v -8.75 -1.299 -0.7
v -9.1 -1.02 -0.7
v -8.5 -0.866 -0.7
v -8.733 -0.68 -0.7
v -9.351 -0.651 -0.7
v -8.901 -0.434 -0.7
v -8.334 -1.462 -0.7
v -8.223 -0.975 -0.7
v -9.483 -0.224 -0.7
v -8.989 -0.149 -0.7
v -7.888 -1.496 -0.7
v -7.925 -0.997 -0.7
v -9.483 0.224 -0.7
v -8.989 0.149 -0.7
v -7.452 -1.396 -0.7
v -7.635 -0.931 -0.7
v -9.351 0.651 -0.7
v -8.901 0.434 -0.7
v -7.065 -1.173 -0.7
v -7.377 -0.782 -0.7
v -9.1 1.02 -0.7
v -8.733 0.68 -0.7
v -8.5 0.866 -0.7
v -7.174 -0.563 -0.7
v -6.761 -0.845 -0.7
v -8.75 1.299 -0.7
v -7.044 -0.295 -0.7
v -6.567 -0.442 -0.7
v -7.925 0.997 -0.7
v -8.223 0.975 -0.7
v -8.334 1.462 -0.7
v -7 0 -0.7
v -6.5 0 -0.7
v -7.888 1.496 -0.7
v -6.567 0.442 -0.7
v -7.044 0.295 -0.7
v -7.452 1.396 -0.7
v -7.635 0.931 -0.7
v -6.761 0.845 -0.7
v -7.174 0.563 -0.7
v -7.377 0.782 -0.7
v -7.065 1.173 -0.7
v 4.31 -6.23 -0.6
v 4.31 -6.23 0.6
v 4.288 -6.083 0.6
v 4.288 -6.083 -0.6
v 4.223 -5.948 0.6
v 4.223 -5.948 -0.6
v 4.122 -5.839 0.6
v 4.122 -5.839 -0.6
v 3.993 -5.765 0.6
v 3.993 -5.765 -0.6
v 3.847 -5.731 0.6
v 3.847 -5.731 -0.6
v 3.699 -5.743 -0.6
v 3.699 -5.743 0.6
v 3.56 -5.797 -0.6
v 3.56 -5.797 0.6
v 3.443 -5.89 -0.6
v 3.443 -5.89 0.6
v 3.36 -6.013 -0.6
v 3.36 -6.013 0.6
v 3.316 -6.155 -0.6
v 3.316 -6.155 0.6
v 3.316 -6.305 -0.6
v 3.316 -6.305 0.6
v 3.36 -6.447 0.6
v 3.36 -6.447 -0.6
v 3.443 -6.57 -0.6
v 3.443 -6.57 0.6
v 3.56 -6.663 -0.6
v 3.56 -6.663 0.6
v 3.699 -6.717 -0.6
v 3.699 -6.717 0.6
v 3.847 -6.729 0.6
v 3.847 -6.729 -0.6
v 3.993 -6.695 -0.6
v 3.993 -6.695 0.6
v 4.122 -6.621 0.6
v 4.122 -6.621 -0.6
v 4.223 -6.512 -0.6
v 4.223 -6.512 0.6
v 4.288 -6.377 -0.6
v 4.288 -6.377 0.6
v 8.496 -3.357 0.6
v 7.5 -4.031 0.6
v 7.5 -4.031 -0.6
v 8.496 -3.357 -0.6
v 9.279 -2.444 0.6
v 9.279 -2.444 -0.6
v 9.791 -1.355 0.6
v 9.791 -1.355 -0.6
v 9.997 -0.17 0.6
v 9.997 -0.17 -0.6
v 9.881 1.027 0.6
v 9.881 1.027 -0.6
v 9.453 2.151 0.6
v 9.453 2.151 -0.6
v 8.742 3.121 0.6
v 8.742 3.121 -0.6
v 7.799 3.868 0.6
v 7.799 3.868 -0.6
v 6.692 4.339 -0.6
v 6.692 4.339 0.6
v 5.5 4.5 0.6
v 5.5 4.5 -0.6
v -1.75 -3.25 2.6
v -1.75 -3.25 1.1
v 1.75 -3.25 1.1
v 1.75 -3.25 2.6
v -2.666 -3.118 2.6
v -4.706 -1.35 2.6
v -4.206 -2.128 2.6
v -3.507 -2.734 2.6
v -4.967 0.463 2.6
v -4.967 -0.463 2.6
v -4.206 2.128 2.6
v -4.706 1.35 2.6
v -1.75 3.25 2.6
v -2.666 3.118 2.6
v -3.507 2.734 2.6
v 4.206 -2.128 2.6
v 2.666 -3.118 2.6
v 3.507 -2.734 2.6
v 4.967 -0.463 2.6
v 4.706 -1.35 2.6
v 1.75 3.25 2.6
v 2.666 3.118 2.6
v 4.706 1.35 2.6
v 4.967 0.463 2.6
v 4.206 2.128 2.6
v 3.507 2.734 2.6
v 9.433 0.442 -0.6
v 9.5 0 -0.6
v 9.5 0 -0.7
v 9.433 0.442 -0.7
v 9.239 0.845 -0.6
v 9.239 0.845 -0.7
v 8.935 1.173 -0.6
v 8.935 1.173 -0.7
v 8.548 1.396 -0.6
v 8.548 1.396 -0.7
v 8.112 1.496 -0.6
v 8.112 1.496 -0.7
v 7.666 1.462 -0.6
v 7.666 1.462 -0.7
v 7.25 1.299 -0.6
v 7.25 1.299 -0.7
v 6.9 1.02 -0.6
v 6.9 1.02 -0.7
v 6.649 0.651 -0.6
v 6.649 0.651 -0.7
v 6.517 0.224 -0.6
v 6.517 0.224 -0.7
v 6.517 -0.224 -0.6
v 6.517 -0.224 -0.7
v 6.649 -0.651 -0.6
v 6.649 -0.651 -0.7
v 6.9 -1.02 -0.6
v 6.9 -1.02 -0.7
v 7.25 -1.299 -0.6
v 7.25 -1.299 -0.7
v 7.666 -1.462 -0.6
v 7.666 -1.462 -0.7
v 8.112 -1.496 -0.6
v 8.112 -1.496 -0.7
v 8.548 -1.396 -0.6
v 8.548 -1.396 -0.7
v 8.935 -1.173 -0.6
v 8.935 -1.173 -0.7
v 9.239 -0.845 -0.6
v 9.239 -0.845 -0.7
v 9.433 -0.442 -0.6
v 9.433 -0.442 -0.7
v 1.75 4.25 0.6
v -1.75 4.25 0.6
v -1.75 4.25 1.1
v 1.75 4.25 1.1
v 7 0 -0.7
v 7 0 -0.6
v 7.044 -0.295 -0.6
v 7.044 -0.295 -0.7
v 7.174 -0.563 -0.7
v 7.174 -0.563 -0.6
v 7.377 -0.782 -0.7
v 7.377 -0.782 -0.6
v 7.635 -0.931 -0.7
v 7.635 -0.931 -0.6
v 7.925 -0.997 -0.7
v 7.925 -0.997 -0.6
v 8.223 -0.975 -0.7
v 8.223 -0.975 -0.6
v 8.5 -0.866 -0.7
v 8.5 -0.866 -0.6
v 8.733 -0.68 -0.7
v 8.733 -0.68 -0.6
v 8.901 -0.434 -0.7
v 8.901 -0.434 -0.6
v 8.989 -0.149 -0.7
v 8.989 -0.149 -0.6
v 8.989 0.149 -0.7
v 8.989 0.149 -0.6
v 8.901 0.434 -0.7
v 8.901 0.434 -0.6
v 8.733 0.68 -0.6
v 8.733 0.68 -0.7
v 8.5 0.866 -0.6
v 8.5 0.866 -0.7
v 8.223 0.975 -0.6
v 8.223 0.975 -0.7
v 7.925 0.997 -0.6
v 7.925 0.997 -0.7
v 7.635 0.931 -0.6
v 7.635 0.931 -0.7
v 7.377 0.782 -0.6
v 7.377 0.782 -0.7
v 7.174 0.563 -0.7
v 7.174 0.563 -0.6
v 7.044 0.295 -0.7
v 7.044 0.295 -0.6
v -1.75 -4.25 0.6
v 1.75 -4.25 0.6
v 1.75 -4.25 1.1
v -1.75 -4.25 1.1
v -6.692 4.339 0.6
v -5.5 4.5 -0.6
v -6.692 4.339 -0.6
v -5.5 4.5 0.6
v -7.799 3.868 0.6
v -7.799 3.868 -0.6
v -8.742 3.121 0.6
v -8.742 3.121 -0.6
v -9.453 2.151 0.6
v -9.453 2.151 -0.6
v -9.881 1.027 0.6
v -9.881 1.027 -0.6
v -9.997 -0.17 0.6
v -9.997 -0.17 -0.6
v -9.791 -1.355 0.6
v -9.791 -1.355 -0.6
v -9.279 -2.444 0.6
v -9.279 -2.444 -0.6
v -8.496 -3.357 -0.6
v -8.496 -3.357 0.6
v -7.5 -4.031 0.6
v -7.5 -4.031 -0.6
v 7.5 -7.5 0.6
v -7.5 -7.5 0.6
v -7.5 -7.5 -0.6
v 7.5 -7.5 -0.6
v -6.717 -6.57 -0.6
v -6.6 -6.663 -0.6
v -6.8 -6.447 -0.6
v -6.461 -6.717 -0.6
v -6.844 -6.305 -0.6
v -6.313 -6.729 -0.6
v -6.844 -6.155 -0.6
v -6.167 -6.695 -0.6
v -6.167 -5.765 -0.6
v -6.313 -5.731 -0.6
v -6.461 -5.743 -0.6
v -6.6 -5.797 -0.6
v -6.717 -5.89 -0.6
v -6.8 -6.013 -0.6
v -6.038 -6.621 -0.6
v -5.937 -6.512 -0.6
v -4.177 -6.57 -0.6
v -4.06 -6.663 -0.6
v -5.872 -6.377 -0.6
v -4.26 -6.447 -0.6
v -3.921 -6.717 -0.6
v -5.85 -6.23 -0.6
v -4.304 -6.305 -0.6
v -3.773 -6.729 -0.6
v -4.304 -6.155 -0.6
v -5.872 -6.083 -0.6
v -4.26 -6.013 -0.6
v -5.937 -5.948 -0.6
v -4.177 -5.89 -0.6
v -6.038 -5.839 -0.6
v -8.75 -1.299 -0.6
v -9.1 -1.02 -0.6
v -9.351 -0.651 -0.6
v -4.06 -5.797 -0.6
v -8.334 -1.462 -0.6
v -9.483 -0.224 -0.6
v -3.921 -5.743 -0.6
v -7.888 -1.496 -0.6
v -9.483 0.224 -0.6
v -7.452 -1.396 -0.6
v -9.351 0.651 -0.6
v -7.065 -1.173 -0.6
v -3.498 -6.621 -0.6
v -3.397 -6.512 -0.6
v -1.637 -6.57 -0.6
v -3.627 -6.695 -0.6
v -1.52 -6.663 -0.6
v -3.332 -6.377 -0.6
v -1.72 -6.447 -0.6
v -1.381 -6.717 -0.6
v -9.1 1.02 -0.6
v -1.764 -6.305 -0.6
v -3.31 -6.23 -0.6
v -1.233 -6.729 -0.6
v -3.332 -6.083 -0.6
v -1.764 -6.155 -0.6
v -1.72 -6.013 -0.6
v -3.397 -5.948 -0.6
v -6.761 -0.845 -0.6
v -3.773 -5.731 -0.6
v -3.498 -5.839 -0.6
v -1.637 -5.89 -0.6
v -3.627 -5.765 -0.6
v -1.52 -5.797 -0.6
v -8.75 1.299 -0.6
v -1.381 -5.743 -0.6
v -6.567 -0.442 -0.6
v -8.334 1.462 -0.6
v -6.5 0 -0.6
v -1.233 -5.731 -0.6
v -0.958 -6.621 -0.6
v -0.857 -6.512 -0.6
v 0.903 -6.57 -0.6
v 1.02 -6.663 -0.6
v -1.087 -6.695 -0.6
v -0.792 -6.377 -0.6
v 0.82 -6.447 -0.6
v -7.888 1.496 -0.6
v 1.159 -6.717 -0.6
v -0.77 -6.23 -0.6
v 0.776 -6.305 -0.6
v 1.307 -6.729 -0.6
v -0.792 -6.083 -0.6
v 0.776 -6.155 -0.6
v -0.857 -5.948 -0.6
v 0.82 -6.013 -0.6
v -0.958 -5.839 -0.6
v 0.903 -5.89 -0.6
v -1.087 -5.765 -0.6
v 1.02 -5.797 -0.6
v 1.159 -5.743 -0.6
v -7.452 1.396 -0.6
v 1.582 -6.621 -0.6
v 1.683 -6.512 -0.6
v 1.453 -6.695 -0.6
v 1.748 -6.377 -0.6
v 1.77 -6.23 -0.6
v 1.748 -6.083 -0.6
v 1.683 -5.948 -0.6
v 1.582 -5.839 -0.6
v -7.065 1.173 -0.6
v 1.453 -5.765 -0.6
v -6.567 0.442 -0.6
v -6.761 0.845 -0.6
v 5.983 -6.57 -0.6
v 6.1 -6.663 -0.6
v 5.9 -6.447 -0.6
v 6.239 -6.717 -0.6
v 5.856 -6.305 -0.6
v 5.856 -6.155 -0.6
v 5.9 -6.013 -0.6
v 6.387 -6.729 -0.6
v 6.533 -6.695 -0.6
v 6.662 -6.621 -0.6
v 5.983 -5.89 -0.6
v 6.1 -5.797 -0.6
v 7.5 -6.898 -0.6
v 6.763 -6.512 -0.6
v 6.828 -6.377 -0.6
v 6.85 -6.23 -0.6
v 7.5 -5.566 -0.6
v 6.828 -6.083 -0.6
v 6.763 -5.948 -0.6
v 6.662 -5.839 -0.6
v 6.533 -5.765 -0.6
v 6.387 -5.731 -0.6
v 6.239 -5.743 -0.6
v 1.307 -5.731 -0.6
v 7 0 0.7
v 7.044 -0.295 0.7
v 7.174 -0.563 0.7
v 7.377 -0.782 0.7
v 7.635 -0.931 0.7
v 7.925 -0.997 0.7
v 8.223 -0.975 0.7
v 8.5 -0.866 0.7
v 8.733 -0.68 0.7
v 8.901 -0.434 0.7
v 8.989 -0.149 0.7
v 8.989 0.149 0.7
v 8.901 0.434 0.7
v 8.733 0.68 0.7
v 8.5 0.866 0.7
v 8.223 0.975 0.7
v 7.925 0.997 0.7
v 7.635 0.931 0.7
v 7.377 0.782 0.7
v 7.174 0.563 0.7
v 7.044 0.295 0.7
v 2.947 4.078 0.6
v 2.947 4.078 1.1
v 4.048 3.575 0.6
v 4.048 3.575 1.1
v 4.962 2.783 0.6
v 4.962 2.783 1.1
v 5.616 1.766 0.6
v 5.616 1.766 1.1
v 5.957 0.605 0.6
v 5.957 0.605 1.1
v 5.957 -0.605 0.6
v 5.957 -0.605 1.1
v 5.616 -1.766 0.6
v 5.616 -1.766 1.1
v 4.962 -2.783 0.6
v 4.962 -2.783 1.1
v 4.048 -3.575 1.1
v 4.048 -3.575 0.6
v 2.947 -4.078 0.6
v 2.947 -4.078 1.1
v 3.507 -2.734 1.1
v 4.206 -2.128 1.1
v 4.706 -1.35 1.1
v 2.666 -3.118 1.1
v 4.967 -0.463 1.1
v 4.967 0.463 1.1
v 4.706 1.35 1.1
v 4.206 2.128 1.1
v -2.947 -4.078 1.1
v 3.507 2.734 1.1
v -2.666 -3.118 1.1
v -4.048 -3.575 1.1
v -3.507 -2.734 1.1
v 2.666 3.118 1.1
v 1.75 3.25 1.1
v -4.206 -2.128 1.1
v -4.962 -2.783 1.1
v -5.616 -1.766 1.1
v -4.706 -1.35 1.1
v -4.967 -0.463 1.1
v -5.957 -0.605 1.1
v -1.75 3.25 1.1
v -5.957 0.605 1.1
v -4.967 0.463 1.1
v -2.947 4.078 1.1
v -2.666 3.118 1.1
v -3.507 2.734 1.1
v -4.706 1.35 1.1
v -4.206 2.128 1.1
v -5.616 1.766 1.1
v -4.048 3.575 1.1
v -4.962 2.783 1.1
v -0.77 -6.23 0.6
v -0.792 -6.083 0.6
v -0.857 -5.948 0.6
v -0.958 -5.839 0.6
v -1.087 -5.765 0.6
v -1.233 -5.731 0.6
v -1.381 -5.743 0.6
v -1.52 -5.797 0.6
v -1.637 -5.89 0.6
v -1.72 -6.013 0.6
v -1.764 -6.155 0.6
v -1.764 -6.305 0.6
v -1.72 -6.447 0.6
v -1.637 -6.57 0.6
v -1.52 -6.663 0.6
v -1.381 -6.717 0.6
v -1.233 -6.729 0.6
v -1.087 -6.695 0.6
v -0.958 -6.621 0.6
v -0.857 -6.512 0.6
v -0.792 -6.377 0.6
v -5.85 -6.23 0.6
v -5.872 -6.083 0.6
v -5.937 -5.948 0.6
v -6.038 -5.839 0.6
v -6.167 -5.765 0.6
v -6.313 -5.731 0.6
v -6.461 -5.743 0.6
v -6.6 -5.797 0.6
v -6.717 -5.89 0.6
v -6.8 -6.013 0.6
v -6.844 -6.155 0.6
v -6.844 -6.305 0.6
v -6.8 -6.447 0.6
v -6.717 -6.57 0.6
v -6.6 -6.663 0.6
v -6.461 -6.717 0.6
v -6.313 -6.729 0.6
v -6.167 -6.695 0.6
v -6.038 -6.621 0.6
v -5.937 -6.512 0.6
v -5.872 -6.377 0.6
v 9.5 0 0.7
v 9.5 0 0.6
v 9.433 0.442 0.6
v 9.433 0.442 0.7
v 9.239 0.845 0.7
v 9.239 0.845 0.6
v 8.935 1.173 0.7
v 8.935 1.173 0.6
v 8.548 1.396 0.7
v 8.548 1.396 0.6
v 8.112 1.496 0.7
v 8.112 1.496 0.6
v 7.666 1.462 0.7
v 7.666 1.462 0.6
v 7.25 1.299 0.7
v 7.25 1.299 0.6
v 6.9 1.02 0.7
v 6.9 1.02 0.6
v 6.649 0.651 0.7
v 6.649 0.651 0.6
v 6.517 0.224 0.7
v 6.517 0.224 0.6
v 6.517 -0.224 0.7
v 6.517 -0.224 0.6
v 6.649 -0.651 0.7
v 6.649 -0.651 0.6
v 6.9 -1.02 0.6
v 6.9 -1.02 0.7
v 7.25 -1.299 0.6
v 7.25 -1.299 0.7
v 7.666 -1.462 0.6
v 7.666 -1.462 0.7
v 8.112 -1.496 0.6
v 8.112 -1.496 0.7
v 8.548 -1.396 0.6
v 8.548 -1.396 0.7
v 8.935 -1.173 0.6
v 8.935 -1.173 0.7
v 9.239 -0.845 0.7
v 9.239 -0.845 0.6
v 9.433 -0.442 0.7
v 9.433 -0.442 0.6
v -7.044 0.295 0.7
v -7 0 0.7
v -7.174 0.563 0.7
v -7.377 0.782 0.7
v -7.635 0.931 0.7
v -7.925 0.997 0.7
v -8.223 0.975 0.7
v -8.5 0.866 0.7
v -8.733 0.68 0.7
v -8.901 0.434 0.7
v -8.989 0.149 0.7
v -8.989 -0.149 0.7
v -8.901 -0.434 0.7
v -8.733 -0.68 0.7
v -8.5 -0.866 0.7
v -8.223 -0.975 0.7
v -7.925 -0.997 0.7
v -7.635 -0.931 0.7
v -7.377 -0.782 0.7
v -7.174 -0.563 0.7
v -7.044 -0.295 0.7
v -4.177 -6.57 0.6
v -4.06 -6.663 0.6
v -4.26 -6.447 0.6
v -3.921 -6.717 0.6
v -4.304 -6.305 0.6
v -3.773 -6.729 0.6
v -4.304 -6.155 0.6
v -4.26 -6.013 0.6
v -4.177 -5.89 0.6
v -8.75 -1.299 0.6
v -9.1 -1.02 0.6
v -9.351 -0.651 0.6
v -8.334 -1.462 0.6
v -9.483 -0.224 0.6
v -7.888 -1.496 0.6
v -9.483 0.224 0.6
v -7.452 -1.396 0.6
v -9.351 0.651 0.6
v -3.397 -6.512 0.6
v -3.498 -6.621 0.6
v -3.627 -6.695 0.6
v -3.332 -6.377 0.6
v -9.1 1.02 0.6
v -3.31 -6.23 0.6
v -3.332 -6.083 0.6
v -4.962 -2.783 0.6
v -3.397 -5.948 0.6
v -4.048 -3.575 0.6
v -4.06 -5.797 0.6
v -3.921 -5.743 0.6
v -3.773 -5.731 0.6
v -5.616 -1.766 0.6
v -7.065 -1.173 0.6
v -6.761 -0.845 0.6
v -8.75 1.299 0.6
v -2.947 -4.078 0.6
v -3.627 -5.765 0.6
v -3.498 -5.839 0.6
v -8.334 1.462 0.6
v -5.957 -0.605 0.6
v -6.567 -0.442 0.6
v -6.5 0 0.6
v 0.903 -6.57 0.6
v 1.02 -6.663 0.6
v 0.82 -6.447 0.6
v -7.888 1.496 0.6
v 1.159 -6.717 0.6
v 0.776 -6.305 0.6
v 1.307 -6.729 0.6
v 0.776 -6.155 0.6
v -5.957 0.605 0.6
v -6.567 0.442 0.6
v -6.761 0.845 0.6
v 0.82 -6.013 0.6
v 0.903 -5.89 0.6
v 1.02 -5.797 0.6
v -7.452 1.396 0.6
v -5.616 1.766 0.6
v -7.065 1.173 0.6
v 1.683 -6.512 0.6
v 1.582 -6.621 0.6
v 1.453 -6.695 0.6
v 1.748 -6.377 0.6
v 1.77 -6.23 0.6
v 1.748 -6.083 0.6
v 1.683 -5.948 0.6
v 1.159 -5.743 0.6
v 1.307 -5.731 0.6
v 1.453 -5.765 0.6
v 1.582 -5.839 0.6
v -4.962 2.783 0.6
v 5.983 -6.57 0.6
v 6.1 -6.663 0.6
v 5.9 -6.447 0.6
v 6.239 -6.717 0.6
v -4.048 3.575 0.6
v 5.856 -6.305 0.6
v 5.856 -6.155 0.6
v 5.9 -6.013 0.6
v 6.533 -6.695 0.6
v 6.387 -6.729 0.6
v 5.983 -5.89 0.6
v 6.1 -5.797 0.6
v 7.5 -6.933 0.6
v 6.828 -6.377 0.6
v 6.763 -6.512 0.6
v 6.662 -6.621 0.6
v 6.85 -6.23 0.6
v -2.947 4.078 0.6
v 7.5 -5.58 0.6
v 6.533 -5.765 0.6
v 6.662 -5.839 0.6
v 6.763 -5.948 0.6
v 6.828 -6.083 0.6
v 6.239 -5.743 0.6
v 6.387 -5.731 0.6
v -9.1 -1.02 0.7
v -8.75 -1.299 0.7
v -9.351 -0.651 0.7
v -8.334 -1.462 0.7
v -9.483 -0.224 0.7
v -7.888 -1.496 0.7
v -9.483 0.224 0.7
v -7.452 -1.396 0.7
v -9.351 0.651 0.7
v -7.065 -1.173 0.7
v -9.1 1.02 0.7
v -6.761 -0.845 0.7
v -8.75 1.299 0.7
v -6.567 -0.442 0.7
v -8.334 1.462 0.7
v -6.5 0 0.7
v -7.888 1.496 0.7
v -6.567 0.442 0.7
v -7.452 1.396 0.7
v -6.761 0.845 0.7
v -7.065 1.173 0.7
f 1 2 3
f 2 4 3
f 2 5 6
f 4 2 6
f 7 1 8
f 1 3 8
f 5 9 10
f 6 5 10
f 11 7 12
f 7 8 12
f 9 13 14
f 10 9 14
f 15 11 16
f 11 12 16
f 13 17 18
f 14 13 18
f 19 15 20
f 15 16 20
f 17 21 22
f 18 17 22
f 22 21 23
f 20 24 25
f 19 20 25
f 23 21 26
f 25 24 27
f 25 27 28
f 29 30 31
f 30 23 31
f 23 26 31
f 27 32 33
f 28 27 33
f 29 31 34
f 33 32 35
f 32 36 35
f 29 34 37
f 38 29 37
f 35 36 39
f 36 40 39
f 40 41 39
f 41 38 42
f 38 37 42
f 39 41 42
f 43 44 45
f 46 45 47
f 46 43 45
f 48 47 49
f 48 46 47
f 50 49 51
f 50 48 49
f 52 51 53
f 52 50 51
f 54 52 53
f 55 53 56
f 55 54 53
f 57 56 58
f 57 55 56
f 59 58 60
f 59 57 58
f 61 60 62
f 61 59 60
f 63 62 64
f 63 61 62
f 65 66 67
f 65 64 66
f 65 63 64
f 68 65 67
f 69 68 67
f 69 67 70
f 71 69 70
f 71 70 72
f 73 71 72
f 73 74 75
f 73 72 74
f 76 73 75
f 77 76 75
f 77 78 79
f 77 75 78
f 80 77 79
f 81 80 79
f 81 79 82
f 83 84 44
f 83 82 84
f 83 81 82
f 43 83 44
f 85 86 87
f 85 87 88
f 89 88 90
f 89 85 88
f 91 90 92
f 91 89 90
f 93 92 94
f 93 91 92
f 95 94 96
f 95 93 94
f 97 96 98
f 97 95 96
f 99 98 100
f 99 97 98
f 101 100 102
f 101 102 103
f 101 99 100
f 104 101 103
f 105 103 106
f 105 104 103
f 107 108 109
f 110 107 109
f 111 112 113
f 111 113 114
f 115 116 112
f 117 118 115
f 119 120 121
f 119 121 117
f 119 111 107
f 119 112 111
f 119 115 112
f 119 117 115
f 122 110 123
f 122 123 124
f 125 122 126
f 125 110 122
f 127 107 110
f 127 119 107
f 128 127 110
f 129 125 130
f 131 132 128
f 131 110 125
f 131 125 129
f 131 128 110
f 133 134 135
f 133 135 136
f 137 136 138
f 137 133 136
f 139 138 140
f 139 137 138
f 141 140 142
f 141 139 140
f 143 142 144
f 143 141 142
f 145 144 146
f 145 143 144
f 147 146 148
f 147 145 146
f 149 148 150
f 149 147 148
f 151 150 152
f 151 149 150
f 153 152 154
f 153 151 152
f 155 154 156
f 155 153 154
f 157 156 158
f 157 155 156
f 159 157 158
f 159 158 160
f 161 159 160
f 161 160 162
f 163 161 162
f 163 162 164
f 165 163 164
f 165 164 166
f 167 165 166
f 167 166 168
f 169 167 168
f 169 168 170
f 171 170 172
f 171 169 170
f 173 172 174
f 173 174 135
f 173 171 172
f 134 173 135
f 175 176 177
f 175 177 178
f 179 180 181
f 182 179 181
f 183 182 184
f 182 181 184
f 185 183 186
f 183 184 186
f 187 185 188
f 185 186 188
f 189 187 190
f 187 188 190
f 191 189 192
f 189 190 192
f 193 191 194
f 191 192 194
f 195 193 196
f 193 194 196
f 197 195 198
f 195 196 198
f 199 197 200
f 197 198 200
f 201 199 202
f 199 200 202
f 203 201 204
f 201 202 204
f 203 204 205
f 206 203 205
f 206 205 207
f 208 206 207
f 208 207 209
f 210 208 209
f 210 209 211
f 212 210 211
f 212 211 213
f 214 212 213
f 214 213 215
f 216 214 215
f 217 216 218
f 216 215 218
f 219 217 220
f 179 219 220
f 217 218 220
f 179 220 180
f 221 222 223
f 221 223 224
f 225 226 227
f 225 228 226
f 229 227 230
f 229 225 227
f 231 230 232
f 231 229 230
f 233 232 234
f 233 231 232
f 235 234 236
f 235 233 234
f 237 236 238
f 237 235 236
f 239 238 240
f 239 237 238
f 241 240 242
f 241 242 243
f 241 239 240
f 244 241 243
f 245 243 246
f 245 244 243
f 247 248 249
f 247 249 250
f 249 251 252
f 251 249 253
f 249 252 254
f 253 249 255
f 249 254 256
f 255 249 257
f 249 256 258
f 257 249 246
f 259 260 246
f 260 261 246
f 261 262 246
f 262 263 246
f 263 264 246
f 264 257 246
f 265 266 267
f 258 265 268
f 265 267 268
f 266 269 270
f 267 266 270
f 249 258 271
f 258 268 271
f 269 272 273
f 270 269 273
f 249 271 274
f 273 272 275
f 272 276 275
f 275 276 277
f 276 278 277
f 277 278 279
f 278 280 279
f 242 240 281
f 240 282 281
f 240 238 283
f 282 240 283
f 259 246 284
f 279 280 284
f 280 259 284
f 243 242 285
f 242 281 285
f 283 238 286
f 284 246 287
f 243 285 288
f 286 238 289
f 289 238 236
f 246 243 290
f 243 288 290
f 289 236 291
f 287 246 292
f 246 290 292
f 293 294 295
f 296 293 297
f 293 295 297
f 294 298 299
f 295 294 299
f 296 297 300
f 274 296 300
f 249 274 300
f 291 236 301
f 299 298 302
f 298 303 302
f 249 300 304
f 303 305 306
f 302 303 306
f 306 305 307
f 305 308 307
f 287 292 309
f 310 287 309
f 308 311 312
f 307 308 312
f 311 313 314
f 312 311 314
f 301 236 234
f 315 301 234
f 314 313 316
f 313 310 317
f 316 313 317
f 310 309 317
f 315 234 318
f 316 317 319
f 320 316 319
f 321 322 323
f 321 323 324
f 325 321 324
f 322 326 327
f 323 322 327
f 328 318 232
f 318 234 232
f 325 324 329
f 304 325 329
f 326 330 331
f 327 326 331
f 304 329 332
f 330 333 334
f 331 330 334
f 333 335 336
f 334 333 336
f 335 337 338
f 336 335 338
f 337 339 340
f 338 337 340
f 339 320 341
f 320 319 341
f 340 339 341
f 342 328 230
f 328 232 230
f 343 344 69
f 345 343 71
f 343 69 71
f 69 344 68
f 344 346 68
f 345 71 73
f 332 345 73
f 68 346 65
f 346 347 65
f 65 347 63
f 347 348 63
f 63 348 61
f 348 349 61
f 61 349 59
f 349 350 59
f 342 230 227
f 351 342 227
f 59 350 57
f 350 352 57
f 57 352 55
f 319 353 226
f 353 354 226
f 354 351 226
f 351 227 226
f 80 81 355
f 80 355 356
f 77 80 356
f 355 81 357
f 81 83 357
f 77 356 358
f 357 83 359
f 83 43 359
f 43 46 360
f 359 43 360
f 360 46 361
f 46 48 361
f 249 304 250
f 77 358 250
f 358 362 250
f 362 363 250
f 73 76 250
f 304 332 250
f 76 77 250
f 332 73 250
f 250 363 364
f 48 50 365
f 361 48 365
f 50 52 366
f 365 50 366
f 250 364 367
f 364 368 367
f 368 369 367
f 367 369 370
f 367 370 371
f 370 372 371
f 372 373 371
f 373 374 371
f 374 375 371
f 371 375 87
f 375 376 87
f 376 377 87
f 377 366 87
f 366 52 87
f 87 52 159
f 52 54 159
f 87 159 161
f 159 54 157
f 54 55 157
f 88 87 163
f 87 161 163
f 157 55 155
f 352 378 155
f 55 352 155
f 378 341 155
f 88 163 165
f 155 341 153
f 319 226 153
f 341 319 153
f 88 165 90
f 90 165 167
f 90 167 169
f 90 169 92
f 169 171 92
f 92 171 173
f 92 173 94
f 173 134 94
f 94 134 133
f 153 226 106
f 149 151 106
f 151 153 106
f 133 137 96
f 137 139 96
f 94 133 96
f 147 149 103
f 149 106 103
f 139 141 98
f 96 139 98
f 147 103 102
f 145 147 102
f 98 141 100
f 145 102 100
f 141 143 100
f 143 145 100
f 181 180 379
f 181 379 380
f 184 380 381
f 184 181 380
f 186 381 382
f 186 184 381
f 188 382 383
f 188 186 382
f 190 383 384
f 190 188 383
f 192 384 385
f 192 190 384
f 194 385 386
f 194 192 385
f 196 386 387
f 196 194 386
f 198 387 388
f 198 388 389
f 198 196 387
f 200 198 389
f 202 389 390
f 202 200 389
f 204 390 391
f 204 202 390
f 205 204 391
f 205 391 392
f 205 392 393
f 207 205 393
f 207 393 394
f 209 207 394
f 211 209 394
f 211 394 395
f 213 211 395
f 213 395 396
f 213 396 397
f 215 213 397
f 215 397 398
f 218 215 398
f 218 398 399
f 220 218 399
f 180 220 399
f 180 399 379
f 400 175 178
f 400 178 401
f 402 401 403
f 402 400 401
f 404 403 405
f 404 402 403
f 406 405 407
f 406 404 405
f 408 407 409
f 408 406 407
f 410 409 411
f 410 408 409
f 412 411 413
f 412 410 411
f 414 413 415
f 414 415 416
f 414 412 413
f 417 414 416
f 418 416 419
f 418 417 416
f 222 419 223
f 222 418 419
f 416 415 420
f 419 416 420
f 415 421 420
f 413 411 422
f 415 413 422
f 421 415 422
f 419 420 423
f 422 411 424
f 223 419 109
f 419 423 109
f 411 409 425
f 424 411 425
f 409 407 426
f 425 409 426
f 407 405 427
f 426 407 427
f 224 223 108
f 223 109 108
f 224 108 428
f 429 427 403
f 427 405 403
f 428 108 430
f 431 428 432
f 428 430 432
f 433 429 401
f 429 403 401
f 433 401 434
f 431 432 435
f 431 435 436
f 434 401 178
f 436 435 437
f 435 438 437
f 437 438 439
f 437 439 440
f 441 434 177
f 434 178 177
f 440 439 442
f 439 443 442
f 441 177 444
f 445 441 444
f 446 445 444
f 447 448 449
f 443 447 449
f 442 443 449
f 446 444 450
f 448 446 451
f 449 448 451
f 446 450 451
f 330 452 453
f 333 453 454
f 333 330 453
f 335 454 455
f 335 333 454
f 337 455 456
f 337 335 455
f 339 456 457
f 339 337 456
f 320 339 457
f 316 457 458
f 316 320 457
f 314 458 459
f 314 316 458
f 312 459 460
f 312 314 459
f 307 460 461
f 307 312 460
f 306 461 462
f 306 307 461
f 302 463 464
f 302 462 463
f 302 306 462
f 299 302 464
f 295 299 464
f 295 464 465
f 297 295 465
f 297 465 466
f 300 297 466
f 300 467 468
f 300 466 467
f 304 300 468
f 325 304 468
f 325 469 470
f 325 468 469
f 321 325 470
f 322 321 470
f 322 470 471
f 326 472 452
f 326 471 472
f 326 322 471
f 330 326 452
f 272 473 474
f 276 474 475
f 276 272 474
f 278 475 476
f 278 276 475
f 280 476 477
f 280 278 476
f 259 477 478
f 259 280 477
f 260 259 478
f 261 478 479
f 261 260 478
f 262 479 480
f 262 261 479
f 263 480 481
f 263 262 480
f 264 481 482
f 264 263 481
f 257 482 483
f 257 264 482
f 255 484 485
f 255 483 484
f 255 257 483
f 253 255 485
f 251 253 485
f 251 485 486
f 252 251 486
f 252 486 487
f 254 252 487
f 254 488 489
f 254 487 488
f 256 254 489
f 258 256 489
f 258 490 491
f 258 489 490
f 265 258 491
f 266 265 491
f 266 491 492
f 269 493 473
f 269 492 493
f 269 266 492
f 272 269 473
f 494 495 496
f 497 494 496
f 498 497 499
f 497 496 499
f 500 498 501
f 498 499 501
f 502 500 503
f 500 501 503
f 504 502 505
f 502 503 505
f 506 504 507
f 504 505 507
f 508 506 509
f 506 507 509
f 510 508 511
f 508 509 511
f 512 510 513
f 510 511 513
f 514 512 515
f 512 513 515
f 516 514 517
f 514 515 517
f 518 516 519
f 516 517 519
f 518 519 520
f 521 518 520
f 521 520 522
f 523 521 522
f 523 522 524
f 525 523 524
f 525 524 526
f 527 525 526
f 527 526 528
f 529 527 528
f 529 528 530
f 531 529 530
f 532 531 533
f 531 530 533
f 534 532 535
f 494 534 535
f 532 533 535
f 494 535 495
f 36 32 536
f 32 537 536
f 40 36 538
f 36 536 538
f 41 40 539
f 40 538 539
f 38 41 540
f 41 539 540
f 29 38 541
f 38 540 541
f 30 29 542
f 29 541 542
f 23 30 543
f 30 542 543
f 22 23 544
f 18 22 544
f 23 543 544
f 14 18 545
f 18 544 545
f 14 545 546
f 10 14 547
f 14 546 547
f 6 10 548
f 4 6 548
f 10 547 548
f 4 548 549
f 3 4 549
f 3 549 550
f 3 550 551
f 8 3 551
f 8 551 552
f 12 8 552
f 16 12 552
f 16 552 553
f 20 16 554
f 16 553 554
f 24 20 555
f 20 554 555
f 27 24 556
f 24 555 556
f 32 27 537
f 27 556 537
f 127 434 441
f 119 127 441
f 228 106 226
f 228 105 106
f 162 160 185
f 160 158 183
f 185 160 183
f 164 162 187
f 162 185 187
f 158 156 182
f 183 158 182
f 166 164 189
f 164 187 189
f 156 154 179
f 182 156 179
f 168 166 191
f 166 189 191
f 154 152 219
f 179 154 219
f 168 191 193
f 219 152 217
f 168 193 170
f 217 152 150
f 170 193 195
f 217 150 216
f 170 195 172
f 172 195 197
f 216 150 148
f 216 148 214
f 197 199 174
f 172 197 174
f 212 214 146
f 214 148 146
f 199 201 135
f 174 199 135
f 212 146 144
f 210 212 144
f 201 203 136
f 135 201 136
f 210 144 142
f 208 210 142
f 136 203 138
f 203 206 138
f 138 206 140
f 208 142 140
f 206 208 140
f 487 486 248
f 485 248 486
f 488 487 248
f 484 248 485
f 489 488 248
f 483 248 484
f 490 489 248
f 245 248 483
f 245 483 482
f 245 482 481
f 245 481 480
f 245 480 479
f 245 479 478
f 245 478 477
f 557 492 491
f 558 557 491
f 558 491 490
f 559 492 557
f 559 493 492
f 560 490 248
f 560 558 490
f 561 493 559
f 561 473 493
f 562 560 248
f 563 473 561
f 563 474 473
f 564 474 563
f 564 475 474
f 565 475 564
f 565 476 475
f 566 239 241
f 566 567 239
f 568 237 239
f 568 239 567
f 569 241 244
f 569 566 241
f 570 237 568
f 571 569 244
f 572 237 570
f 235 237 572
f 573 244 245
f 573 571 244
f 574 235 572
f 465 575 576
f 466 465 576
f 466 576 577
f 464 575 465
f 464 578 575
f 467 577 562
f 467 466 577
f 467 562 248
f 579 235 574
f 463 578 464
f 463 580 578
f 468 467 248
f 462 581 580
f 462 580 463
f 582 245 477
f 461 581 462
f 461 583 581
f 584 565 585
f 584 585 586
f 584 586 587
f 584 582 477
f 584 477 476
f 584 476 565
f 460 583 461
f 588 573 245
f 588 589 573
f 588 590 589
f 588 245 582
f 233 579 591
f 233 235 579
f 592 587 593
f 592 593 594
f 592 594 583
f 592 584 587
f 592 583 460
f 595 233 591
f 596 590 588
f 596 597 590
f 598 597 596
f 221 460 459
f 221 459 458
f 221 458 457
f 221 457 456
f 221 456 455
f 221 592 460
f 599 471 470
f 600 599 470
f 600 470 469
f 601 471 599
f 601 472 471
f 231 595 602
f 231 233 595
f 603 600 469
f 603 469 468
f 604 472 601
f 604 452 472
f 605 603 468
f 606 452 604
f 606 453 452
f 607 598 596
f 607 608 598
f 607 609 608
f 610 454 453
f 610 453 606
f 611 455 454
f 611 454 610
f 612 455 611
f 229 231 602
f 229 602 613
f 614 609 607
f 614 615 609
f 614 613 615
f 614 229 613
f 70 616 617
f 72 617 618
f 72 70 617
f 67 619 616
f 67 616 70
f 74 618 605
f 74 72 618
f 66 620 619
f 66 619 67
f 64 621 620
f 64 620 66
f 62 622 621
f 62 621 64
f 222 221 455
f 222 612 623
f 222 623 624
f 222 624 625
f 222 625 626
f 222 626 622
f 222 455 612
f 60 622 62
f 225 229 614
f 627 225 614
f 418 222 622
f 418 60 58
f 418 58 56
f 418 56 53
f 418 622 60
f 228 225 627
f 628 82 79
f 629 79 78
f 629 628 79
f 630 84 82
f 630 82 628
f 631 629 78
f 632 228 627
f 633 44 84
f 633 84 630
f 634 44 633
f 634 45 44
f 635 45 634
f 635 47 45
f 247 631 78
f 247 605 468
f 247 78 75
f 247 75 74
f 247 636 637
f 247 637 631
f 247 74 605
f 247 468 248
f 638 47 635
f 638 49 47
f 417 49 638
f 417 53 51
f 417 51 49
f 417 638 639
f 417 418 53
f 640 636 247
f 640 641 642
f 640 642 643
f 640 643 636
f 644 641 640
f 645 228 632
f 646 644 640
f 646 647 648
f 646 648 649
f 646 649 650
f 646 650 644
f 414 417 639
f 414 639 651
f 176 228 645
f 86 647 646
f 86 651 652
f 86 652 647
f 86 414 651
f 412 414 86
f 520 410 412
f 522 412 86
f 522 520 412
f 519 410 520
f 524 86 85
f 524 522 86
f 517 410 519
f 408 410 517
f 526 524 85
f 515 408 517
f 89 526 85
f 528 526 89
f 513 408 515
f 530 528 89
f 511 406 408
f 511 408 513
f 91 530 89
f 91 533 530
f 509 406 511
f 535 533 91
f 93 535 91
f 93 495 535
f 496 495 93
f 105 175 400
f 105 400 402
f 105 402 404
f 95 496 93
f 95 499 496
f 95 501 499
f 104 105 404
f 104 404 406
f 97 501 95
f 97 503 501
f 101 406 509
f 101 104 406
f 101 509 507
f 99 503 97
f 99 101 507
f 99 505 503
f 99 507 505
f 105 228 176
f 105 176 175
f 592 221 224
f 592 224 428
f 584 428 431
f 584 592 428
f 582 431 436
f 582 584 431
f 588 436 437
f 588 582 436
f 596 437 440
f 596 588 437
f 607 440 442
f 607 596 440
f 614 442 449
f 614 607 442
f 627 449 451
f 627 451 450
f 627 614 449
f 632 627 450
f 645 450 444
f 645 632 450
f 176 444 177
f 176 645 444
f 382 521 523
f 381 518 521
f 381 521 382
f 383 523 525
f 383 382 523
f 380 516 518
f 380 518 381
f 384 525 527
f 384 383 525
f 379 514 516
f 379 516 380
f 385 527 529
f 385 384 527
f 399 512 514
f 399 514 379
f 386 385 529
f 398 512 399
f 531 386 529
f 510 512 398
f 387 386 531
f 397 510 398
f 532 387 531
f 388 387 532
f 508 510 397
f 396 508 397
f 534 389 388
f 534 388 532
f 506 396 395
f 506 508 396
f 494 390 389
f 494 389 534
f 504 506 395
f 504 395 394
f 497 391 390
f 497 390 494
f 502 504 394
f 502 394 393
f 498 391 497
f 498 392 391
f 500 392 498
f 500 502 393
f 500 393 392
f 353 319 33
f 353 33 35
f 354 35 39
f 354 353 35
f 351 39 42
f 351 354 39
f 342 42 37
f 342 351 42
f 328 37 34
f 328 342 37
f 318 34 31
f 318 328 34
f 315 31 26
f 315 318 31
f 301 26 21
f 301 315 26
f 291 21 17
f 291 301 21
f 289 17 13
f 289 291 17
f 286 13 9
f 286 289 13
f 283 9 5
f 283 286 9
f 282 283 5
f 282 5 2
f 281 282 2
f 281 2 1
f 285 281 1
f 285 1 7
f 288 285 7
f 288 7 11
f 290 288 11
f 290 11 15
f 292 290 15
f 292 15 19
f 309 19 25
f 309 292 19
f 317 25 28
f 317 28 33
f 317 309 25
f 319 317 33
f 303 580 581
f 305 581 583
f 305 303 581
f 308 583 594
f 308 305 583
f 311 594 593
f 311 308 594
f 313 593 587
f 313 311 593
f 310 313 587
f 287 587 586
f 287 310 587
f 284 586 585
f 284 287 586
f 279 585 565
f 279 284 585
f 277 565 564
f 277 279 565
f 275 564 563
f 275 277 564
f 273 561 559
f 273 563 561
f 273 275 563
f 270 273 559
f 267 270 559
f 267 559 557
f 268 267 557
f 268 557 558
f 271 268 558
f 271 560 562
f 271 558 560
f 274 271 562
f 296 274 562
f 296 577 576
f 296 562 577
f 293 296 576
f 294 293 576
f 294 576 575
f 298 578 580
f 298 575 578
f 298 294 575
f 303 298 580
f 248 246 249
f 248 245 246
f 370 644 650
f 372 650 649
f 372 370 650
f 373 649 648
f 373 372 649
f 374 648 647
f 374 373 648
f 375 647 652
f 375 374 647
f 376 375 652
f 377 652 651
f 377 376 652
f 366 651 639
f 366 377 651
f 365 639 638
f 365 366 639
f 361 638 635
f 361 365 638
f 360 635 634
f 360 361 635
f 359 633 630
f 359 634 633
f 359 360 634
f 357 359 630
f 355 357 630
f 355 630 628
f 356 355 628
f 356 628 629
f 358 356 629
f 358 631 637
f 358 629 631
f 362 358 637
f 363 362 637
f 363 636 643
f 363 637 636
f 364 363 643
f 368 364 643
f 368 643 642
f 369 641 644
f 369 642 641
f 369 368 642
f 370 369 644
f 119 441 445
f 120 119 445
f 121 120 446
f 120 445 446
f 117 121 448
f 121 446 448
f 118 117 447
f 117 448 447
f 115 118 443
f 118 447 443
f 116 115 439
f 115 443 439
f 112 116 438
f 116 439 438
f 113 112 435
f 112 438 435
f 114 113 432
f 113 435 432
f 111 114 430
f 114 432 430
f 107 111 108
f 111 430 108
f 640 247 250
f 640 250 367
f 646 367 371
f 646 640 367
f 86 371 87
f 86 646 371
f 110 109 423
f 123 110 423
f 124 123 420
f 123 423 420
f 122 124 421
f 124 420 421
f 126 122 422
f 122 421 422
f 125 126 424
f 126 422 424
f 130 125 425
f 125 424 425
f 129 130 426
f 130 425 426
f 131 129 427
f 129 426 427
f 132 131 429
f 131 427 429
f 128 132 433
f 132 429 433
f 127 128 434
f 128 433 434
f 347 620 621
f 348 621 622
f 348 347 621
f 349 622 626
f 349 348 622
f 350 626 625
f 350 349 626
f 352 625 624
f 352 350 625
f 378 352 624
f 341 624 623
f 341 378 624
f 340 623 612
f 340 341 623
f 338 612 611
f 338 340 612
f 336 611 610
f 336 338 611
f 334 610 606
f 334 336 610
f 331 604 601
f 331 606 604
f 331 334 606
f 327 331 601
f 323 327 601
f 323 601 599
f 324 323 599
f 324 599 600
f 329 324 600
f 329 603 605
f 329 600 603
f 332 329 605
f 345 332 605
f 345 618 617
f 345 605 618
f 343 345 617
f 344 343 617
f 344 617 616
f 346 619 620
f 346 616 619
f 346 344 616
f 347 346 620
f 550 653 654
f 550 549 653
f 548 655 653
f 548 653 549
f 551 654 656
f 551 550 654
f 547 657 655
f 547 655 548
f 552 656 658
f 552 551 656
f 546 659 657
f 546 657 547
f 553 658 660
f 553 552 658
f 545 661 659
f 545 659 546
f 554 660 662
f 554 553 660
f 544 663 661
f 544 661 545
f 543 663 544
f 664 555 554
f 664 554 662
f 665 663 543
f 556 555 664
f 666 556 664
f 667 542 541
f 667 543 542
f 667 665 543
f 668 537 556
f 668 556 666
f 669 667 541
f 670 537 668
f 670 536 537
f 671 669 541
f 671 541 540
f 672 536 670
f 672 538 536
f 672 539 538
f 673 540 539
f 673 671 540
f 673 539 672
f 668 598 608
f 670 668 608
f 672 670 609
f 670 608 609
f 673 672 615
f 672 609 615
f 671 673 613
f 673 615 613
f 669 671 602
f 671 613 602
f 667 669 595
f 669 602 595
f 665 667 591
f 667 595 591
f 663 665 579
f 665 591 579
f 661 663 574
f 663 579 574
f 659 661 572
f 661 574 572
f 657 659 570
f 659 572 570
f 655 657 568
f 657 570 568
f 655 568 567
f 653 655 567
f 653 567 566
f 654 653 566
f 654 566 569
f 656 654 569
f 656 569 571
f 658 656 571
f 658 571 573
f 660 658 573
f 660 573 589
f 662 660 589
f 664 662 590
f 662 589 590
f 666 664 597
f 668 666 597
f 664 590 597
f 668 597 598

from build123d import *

# Parameters (mm, degrees)
ESQUISSE1_R           = 1
ESQUISSE1_R_2         = 0.5
BOSS_EXTRU_1_DEPTH    = 0.6
BOSS_EXTRU_2_DEPTH    = 0.5
BOSS_EXTRU_4_DEPTH    = 1.5
ESQUISSE3_R           = 1.5
ESQUISSE3_R_2         = 1
ESQUISSE3_R_3         = 0.65
ESQUISSE3_R_4         = 0.5
BOSS_EXTRU_3_DEPTH    = 0.1
CROQUIS1_W            = 0.446175557
CROQUIS1_H            = 1.332309964
CROQUIS1_W_2          = 0.675567057
CROQUIS1_H_2          = 1.353271183
CORTAR_EXTRUIR1_DEPTH = 17


with BuildPart() as part:
    # Esquisse1 → Boss.-Extru.1 (new, symmetric)
    with BuildSketch(Plane.XY):
        with BuildLine():
            Line((-7.5, -4.031128874), (-7.5, -7.5))
            Line((-7.5, -7.5), (7.5, -7.5))
            Line((7.5, -7.5), (7.5, -4.031128874))
            ThreePointArc((7.5, -4.031128874), (9.88121444, 1.027112473), (5.5, 4.5))
            Line((5.5, 4.5), (-5.5, 4.5))
            ThreePointArc((-5.5, 4.5), (-9.88121444, 1.027112473), (-7.5, -4.031128874))
        make_face()
        with Locations((-8, 0)):
            Circle(ESQUISSE1_R, mode=Mode.SUBTRACT)
        with Locations(Location((8, 0, 0), (0, 0, 180))):
            Circle(ESQUISSE1_R, mode=Mode.SUBTRACT)
        with Locations((-6.35, -6.23)):
            Circle(ESQUISSE1_R_2, mode=Mode.SUBTRACT)
        with Locations((-3.81, -6.23)):
            Circle(ESQUISSE1_R_2, mode=Mode.SUBTRACT)
        with Locations((-1.27, -6.23)):
            Circle(ESQUISSE1_R_2, mode=Mode.SUBTRACT)
        with Locations((1.27, -6.23)):
            Circle(ESQUISSE1_R_2, mode=Mode.SUBTRACT)
        with Locations((3.81, -6.23)):
            Circle(ESQUISSE1_R_2, mode=Mode.SUBTRACT)
        with Locations((6.35, -6.23)):
            Circle(ESQUISSE1_R_2, mode=Mode.SUBTRACT)
    extrude(amount=BOSS_EXTRU_1_DEPTH, both=True)

    # Esquisse2 → Boss.-Extru.2 (add)
    with BuildSketch(Plane.XY.offset(0.6)):
        with BuildLine():
            Line((-1.75, 4.25), (1.75, 4.25))
            ThreePointArc((1.75, 4.25), (6, 0), (1.75, -4.25))
            Line((1.75, -4.25), (-1.75, -4.25))
            ThreePointArc((-1.75, -4.25), (-6, 0), (-1.75, 4.25))
        make_face()
    extrude(amount=BOSS_EXTRU_2_DEPTH)

    # Esquisse4 → Boss.-Extru.4 (add)
    with BuildSketch(Plane.XY.offset(1.1)):
        with BuildLine():
            Line((-1.75, -3.25), (1.75, -3.25))
            ThreePointArc((1.75, -3.25), (5, 0), (1.75, 3.25))
            Line((1.75, 3.25), (-1.75, 3.25))
            ThreePointArc((-1.75, 3.25), (-5, 0), (-1.75, -3.25))
        make_face()
    extrude(amount=BOSS_EXTRU_4_DEPTH)

    # Esquisse3 → Boss.-Extru.3 (add)
    # profile 1 of 8: a face of its own
    with BuildSketch(Plane.XY.offset(0.6)):
        with Locations((-8, 0)):
            Circle(ESQUISSE3_R)
        with Locations((-8, 0)):
            Circle(ESQUISSE3_R_2, mode=Mode.SUBTRACT)
    # profile 2 of 8: a face of its own
    with BuildSketch(Plane.XY.offset(0.6)):
        with Locations((8, 0)):
            Circle(ESQUISSE3_R)
        with Locations(Location((8, 0, 0), (0, 0, 180))):
            Circle(ESQUISSE3_R_2, mode=Mode.SUBTRACT)
    # profile 3 of 8: a face of its own
    with BuildSketch(Plane.XY.offset(0.6)):
        with Locations((-6.35, -6.23)):
            Circle(ESQUISSE3_R_3)
        with Locations((-6.35, -6.23)):
            Circle(ESQUISSE3_R_4, mode=Mode.SUBTRACT)
    # profile 4 of 8: a face of its own
    with BuildSketch(Plane.XY.offset(0.6)):
        with Locations((-3.81, -6.23)):
            Circle(ESQUISSE3_R_3)
        with Locations((-3.81, -6.23)):
            Circle(ESQUISSE3_R_4, mode=Mode.SUBTRACT)
    # profile 5 of 8: a face of its own
    with BuildSketch(Plane.XY.offset(0.6)):
        with Locations((-1.27, -6.23)):
            Circle(ESQUISSE3_R_3)
        with Locations((-1.27, -6.23)):
            Circle(ESQUISSE3_R_4, mode=Mode.SUBTRACT)
    # profile 6 of 8: a face of its own
    with BuildSketch(Plane.XY.offset(0.6)):
        with Locations((1.27, -6.23)):
            Circle(ESQUISSE3_R_3)
        with Locations((1.27, -6.23)):
            Circle(ESQUISSE3_R_4, mode=Mode.SUBTRACT)
    # profile 7 of 8: a face of its own
    with BuildSketch(Plane.XY.offset(0.6)):
        with Locations((3.81, -6.23)):
            Circle(ESQUISSE3_R_3)
        with Locations((3.81, -6.23)):
            Circle(ESQUISSE3_R_4, mode=Mode.SUBTRACT)
    # profile 8 of 8: a face of its own
    with BuildSketch(Plane.XY.offset(0.6)):
        with Locations((6.35, -6.23)):
            Circle(ESQUISSE3_R_3)
        with Locations((6.35, -6.23)):
            Circle(ESQUISSE3_R_4, mode=Mode.SUBTRACT)
    boss_extru_3 = extrude(amount=BOSS_EXTRU_3_DEPTH)

    # Symétrie1: Boss.-Extru.3 across plane
    add(boss_extru_3.mirror(Plane.XY))

    # Croquis1 → Cortar-Extruir1 (cut)
    with BuildSketch(Plane(origin=(7.5, 0, 0), x_dir=(0, 0, -1), z_dir=(1, 0, 0))):
        with Locations((0.823087779, -6.23167244)):
            Rectangle(CROQUIS1_W, CROQUIS1_H)
        with Locations((-0.937783529, -6.256635592)):
            Rectangle(CROQUIS1_W_2, CROQUIS1_H_2)
    extrude(amount=-CORTAR_EXTRUIR1_DEPTH, mode=Mode.SUBTRACT)


solid = part.part
